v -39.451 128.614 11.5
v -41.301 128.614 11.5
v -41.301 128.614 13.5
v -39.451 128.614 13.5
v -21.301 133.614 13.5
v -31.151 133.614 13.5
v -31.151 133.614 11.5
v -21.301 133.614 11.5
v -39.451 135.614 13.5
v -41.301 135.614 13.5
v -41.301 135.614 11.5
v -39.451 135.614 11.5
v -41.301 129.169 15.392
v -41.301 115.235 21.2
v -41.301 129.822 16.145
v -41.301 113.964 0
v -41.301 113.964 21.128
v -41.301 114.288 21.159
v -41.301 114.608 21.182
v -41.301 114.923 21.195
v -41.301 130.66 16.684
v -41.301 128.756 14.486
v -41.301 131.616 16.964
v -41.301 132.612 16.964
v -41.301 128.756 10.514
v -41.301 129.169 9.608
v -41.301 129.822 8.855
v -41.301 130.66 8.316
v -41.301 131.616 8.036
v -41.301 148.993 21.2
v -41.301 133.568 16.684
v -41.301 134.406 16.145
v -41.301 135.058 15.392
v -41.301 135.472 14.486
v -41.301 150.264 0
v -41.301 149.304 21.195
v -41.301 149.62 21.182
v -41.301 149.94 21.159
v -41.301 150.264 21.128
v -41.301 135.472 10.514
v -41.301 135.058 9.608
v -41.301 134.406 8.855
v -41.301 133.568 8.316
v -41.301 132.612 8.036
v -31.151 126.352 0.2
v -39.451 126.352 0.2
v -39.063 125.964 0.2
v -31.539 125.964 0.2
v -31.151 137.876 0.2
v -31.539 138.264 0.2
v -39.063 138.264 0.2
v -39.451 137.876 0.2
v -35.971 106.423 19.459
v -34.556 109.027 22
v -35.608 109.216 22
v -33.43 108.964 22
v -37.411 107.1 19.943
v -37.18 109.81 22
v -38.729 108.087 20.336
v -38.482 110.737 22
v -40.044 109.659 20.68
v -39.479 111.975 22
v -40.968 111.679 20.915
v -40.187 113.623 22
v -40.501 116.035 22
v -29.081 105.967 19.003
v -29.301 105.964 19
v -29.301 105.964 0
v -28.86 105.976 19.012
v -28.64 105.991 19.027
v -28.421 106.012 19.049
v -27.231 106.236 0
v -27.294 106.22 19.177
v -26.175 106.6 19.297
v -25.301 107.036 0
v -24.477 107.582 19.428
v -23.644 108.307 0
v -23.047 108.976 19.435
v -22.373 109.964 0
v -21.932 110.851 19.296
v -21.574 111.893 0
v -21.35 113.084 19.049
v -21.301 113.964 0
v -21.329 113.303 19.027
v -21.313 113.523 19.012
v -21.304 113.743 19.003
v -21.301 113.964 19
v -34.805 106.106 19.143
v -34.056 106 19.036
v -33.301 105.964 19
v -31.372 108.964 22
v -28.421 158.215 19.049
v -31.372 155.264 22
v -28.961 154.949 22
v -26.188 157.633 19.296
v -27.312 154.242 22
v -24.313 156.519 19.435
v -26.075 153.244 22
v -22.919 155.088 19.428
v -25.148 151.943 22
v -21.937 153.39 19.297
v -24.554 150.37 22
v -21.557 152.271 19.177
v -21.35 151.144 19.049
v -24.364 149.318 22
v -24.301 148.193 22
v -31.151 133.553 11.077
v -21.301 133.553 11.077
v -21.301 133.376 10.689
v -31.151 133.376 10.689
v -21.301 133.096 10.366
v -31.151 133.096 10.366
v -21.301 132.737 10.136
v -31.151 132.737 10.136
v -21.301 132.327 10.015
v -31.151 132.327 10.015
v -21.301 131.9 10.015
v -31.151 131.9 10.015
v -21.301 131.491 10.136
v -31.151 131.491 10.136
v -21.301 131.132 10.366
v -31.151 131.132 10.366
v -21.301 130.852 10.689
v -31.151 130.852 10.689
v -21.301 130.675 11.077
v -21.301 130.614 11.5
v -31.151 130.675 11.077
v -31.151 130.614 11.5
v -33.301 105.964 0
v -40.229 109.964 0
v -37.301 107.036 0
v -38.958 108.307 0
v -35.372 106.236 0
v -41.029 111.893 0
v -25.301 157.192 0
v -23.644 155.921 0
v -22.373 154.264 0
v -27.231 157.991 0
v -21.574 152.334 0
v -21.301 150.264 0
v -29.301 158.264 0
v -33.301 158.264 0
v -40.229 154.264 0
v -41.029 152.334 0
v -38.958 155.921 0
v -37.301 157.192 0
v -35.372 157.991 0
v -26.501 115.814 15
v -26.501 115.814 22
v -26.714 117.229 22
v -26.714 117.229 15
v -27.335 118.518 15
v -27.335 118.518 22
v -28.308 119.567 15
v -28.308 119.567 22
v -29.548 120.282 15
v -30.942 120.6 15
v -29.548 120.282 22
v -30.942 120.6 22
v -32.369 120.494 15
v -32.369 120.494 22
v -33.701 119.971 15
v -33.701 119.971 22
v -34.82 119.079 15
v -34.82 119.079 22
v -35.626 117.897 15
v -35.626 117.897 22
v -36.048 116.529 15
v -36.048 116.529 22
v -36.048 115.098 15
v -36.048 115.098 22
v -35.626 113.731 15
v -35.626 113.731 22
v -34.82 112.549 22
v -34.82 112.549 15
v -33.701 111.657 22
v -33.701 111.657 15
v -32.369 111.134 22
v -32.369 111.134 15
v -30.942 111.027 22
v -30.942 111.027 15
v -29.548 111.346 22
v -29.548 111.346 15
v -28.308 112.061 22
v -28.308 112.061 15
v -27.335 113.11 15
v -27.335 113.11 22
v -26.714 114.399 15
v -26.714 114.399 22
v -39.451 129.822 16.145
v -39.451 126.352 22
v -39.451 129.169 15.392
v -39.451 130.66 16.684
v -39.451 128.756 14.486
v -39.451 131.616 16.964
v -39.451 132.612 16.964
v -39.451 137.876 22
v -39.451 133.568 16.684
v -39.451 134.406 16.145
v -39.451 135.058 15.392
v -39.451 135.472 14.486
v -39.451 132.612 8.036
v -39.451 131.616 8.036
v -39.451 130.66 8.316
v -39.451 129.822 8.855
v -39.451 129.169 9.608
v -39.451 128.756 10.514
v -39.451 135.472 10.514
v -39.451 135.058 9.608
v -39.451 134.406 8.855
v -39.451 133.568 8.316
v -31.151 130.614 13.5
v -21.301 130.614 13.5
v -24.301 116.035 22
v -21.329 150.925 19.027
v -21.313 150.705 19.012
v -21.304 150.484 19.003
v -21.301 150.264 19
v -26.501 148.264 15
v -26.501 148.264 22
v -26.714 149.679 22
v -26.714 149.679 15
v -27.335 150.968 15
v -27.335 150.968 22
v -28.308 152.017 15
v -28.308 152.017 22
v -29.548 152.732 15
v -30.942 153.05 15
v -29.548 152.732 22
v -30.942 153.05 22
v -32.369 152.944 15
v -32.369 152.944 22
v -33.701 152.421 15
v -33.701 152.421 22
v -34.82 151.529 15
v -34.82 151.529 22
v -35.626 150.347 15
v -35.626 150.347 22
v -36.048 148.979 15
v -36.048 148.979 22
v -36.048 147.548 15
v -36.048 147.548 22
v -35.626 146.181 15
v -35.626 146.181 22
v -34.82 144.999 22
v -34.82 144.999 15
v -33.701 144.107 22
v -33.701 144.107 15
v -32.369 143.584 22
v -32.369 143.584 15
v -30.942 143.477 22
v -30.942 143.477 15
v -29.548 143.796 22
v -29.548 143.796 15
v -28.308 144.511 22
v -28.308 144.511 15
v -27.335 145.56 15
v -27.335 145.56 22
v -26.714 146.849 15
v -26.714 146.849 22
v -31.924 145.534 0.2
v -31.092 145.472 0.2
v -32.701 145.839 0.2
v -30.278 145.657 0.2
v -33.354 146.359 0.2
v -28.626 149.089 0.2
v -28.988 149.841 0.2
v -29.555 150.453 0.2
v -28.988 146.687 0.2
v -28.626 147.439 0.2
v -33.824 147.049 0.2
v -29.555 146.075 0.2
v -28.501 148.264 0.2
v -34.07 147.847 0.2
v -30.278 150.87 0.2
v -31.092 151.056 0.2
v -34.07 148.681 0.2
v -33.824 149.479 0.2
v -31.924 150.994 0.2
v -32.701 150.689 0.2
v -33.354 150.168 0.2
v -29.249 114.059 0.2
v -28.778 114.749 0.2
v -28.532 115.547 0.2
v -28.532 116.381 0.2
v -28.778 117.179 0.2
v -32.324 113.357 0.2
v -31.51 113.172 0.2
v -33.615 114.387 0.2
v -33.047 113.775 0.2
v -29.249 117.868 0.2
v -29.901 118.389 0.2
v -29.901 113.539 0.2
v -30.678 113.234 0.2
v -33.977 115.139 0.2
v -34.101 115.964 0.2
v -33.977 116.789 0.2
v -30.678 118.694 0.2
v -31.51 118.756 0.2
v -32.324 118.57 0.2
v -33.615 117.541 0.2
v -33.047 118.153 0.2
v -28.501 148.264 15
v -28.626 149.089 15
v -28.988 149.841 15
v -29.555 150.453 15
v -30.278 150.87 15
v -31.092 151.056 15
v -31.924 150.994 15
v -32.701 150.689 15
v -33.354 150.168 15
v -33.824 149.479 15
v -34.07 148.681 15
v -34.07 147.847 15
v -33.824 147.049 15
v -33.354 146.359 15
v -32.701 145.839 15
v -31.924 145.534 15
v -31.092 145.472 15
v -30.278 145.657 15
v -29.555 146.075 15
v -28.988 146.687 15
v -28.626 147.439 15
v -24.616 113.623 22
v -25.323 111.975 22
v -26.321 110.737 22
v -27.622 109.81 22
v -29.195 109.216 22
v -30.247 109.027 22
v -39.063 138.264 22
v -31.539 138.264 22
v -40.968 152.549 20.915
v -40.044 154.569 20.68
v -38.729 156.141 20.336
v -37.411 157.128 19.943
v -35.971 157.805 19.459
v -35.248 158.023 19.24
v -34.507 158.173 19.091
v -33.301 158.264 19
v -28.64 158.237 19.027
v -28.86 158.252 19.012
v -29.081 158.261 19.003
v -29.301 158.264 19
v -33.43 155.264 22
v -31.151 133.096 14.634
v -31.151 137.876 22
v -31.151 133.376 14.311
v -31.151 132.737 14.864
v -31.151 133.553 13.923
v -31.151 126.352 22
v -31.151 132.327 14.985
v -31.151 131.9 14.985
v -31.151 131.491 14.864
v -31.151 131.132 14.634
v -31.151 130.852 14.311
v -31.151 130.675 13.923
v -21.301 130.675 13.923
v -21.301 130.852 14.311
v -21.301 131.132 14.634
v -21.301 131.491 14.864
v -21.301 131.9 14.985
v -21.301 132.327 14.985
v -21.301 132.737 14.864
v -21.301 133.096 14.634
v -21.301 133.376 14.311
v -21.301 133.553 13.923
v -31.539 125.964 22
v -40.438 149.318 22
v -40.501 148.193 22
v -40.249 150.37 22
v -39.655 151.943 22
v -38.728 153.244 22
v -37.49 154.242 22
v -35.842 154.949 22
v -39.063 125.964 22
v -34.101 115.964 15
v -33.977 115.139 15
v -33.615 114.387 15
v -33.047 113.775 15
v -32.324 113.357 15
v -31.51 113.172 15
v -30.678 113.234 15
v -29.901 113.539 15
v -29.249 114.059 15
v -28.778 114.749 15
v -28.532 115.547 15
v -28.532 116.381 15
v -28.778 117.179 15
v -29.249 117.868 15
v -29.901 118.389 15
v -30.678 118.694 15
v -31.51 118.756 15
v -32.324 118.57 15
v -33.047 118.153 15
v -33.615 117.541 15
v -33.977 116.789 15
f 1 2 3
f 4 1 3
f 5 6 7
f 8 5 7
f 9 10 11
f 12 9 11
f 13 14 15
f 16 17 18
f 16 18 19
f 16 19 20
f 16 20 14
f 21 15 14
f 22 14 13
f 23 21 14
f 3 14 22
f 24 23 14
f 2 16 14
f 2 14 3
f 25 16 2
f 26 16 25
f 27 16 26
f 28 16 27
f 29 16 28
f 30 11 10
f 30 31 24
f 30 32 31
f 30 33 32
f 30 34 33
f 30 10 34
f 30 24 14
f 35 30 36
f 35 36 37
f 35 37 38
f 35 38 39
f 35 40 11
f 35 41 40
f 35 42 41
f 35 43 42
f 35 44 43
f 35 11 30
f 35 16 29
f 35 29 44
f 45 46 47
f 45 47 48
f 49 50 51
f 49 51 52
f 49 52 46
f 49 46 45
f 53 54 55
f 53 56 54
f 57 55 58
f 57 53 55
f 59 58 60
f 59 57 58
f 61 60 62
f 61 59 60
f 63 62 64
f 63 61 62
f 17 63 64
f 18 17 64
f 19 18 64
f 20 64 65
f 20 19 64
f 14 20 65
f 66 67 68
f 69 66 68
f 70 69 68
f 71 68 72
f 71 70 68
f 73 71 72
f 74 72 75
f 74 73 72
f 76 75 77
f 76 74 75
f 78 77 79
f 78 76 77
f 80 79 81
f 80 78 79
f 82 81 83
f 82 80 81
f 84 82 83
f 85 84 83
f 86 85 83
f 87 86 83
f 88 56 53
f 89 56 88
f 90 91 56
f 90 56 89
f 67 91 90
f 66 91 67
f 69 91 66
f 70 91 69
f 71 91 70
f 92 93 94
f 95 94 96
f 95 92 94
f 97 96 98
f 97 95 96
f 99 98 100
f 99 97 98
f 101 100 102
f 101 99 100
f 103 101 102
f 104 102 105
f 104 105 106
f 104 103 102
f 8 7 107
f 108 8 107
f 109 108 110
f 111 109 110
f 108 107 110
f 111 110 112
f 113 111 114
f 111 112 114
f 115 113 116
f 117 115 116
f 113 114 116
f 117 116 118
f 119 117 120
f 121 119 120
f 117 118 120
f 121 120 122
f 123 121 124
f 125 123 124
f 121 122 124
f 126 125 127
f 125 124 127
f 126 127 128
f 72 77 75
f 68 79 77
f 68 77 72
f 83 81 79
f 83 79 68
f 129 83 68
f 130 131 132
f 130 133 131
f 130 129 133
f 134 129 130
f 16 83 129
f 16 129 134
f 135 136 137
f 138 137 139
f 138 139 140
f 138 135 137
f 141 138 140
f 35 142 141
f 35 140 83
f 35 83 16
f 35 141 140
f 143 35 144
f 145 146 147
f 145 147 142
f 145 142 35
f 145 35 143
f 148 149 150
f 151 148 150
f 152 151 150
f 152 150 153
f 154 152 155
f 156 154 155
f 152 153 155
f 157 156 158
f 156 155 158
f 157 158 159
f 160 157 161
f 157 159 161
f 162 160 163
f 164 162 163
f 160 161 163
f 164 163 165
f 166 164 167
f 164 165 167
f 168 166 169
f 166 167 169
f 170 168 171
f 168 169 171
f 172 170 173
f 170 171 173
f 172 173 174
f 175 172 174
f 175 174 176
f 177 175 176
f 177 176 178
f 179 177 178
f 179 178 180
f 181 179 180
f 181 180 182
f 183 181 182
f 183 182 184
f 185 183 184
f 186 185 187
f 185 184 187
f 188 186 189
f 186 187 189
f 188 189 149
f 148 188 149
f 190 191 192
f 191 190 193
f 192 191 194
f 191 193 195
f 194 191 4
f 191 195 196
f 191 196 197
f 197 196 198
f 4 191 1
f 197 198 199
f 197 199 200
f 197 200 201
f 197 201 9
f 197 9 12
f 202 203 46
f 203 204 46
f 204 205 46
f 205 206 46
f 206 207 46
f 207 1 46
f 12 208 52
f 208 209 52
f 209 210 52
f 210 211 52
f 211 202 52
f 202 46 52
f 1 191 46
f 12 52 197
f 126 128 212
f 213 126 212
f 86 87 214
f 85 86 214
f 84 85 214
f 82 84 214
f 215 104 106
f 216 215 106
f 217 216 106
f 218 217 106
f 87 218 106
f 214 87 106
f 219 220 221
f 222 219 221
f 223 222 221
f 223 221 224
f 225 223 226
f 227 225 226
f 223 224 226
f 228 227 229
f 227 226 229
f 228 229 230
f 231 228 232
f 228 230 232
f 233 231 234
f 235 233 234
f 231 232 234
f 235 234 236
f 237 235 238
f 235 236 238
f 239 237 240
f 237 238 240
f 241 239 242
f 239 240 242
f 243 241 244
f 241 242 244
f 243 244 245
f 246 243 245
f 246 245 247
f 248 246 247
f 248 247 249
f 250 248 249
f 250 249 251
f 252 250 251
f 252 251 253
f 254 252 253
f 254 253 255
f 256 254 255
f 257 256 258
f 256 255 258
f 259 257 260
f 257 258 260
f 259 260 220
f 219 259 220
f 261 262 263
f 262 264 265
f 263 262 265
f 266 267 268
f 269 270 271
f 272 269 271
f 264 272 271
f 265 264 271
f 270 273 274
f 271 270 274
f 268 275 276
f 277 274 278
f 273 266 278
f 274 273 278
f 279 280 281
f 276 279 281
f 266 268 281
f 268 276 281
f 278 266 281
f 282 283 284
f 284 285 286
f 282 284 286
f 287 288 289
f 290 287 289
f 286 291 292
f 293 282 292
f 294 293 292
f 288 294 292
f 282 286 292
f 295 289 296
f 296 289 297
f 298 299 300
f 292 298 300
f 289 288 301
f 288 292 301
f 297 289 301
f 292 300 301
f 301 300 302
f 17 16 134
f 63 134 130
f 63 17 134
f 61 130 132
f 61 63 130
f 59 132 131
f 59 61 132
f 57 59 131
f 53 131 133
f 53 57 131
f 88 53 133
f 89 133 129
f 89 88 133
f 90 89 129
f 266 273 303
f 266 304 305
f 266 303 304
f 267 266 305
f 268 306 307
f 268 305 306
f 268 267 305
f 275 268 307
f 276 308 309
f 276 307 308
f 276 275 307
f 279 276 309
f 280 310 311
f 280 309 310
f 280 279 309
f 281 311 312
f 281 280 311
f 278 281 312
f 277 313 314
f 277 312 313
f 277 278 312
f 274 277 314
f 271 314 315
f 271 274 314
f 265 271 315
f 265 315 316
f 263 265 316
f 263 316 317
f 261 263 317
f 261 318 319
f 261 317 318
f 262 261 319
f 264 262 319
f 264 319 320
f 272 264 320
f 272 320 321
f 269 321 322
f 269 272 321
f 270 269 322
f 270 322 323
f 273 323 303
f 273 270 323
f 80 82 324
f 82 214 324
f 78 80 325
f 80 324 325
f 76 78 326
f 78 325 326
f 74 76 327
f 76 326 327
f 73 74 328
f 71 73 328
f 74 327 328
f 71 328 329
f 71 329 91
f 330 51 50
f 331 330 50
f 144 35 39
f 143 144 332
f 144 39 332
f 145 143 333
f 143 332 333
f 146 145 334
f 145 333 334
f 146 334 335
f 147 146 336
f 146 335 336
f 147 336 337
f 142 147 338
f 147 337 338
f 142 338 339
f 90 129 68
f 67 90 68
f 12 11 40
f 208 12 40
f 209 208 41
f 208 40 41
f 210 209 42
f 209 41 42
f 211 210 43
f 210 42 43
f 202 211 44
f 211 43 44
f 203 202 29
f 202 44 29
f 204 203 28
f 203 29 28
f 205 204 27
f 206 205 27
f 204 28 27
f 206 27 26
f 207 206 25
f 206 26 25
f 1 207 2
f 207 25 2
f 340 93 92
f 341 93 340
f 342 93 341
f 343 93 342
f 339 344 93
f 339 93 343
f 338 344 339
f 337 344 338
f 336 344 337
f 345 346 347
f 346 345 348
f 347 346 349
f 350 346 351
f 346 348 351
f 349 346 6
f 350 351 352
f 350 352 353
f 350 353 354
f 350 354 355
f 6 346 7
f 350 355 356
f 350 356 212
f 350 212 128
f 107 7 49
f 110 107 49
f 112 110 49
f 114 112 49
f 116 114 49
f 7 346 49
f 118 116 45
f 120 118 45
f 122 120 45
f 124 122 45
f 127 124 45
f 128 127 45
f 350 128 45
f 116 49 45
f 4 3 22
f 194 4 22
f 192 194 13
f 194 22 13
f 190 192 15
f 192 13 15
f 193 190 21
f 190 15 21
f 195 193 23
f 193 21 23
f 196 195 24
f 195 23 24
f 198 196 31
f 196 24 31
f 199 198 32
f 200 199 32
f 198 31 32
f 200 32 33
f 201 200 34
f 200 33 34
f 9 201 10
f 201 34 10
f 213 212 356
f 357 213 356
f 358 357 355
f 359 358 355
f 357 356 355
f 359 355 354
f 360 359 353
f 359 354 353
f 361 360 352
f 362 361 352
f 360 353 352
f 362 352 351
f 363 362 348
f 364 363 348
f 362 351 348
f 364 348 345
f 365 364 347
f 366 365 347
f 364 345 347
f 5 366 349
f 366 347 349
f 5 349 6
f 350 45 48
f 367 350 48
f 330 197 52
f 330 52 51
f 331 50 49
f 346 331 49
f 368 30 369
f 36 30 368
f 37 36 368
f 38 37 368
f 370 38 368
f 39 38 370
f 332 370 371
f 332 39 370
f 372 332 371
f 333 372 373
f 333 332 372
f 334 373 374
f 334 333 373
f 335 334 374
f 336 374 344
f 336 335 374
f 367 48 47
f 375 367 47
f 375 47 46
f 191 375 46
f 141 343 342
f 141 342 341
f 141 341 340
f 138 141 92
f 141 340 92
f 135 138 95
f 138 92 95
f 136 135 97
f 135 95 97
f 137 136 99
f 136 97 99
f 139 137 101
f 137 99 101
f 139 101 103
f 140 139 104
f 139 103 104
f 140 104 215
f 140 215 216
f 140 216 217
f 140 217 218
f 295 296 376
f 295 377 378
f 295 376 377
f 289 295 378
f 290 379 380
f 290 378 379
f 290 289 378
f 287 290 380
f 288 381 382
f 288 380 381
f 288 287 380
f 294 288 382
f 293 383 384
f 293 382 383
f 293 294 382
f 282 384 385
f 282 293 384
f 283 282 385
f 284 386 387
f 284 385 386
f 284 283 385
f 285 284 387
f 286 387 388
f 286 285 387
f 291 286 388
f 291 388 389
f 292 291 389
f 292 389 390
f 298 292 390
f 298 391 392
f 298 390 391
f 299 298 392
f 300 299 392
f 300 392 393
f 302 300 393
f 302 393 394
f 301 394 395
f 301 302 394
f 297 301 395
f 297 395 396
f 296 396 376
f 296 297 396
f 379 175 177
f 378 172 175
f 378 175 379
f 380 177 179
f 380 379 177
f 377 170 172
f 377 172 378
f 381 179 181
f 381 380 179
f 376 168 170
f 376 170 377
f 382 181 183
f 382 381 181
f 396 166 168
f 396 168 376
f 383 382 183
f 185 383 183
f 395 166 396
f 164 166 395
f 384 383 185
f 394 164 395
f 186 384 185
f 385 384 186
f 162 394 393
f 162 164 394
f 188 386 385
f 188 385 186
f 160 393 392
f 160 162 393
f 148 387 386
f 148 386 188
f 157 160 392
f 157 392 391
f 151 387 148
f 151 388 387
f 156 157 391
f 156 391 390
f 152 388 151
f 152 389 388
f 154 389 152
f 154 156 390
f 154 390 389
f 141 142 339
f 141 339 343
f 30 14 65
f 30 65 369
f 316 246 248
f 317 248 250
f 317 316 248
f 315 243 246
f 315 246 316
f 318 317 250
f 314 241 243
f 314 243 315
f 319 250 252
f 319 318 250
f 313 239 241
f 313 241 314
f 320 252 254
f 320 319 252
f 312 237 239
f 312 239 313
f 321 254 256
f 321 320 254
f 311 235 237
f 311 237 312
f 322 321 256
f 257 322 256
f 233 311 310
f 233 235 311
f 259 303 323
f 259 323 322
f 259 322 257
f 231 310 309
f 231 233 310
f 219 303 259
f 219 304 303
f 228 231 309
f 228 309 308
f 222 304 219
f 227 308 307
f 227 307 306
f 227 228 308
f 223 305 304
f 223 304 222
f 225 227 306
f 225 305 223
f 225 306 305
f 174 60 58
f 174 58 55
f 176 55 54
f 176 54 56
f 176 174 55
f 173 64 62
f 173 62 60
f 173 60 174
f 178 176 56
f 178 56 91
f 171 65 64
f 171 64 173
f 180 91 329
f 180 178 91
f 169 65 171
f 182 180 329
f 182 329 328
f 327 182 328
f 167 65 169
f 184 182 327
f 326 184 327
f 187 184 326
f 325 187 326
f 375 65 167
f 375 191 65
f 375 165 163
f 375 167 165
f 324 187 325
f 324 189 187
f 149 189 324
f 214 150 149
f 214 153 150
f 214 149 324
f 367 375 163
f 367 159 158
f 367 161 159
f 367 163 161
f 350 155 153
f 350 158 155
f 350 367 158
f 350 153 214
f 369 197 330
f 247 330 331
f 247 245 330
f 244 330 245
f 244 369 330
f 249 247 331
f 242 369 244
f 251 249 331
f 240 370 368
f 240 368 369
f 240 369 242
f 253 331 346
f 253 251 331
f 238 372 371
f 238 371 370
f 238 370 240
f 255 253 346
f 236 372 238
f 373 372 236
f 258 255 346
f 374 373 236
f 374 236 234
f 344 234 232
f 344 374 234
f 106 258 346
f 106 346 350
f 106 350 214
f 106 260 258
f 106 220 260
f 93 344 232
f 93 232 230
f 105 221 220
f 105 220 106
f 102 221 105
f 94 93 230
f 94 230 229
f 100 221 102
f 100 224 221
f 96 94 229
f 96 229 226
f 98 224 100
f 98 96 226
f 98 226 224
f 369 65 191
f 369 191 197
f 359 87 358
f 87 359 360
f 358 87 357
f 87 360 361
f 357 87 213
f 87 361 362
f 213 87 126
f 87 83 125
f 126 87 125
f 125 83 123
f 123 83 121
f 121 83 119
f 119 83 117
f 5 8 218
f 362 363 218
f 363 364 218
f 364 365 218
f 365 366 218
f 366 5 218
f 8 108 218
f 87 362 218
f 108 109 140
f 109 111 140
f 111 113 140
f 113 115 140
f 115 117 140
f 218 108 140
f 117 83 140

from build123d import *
from build123d.topology import SkipClean

# Parameters (mm, degrees)
SZKIC1_W                        = 20
SZKIC1_H                        = 52.3
SZKIC1_R                        = 2.8
DODANIE_WYCI_GNI_CIE1_DEPTH     = 22
SZKIC2_R                        = 4.8
WYTNIJ_WYCI_GNI_CIE1_DEPTH      = 7
ZAOKR_GLENIE1_R                 = 8
WYTNIJ_WYCI_GNI_CIE2_DEPTH      = 161.813163879
WYTNIJ_WYCI_GNI_CIE2_DEPTH_BACK = 161.813163879
WYTNIJ_WYCI_GNI_CIE3_REACH      = 163.032
SZKIC7_R                        = 2.8
DODANIE_WYCI_GNI_CIE2_DEPTH     = 0.2
SFAZOWANIE1_SIZE                = 3
SFAZOWANIE2_SIZE                = 3
ZAOKR_GLENIE2_R                 = 10
SFAZOWANIE3_SIZE                = 0.8
ZAOKR_GLENIE3_START             = -102
ZAOKR_GLENIE3_DEPTH             = 6.947286026
ZAOKR_GLENIE3_START_2           = 51
ZAOKR_GLENIE3_2_DEPTH           = 6.499237843


with BuildPart() as part:
    # Szkic1 → Dodanie-wyciągnięcie1 (new body)
    with BuildSketch(Plane.XY):
        with Locations((-31.301196691, 132.11386567)):
            Rectangle(SZKIC1_W, SZKIC1_H)
        with Locations((-31.301196691, 148.26386567)):
            Circle(SZKIC1_R, mode=Mode.SUBTRACT)
        with Locations(Location((-31.301196691, 115.96386567, 0), (0, 0, 180))):
            Circle(SZKIC1_R, mode=Mode.SUBTRACT)
        Polygon((-33.860213685, 125.96386567), (-39.063328725, 125.96386567), (-39.451196691, 126.351733636), (-39.451196691, 137.875997705), (-39.063328725, 138.26386567), (-33.860213685, 138.26386567), (-33.560213685, 138.26386567), (-33.042179696, 138.26386567), (-32.742179696, 138.26386567), (-31.539064656, 138.26386567), (-31.151196691, 137.875997705), (-31.151196691, 126.351733636), (-31.539064656, 125.96386567), (-32.742179696, 125.96386567), (-33.042179696, 125.96386567), (-33.560213685, 125.96386567), align=None, mode=Mode.SUBTRACT)
    extrude(amount=DODANIE_WYCI_GNI_CIE1_DEPTH)

    # Szkic2 → Wytnij-wyciągnięcie1 (cut)
    with BuildSketch(Plane.XY.offset(22)):
        with Locations((-31.301196691, 148.26386567)):
            Circle(SZKIC2_R)
        with Locations((-31.301196691, 115.81386567)):
            Circle(SZKIC2_R)
    extrude(amount=-WYTNIJ_WYCI_GNI_CIE1_DEPTH, mode=Mode.SUBTRACT)

    # Zaokrąglenie1
    zaokr_glenie1_edges = [part.edges().sort_by_distance(p)[0] for p in [
        (-41.301196691, 105.96386567, 11),
        (-41.301196691, 158.26386567, 11),
        (-21.301196691, 158.26386567, 11),
        (-21.301196691, 105.96386567, 11),
    ]]
    fillet(zaokr_glenie1_edges, radius=ZAOKR_GLENIE1_R)

    # Szkic4 → Wytnij-wyciągnięcie2 (cut, two sides: drawn at the far end of the back side and taken through both)
    with BuildSketch(Plane(origin=(-39.451196691, 0, 0), x_dir=(0, 0, -1), z_dir=(1, 0, 0)).offset(-WYTNIJ_WYCI_GNI_CIE2_DEPTH_BACK)):
        with BuildLine():
            Line((-13.5, 133.61386567), (-11.5, 133.61386567))
            ThreePointArc((-11.5, 133.61386567), (-10, 132.11386567), (-11.5, 130.61386567))
            Line((-11.5, 130.61386567), (-13.5, 130.61386567))
            ThreePointArc((-13.5, 130.61386567), (-15, 132.11386567), (-13.5, 133.61386567))
        make_face()
    extrude(amount=WYTNIJ_WYCI_GNI_CIE2_DEPTH + WYTNIJ_WYCI_GNI_CIE2_DEPTH_BACK, mode=Mode.SUBTRACT)

    # Szkic6 → Wytnij-wyciągnięcie3 (cut, up to next)
    with BuildSketch(Plane.ZY.offset(41.301196691), mode=Mode.PRIVATE) as wytnij_wyci_gni_cie3_sk1:
        with BuildLine():
            Line((11.5, 128.61386567), (13.5, 128.61386567))
            ThreePointArc((13.5, 128.61386567), (17, 132.11386567), (13.5, 135.61386567))
            Line((13.5, 135.61386567), (11.5, 135.61386567))
            ThreePointArc((11.5, 135.61386567), (8, 132.11386567), (11.5, 128.61386567))
        make_face()
    wytnij_wyci_gni_cie3_tool1 = extrude(wytnij_wyci_gni_cie3_sk1.sketch, amount=-WYTNIJ_WYCI_GNI_CIE3_REACH, mode=Mode.PRIVATE) & part.part
    add(wytnij_wyci_gni_cie3_tool1.solids().sort_by_distance((-41.301197, 132.113866, 12.5))[0], mode=Mode.SUBTRACT)

    # Szkic7 → Dodanie-wyciągnięcie2 (add)
    with BuildSketch(Plane(origin=(0, 0, 0), x_dir=(-1, 0, 0), z_dir=(0, 0, -1))):
        with Locations((31.301196691, 115.96386567)):
            Circle(SZKIC7_R)
        with Locations((31.301196691, 148.26386567)):
            Circle(SZKIC7_R)
        Polygon((31.539064656, 125.96386567), (31.151196691, 126.351733636), (31.151196691, 137.875997705), (31.539064656, 138.26386567), (39.063328725, 138.26386567), (39.451196691, 137.875997705), (39.451196691, 126.351733636), (39.063328725, 125.96386567), align=None)
    extrude(amount=-DODANIE_WYCI_GNI_CIE2_DEPTH)

    # Sfazowanie1
    # the kernel refuses this chamfer: 3 mm, written as the material it takes off along each edge
    with BuildSketch(Plane(origin=(-21.301196691, 157.978914634, 22), x_dir=(0, 0, -1), z_dir=(0, -1, 0))) as sfazowanie1_piece_1:
        Polygon((SFAZOWANIE1_SIZE, 0), (0, -SFAZOWANIE1_SIZE), (0, 0), align=None)
    extrude(amount=51.730097928, mode=Mode.SUBTRACT)

    # Sfazowanie2
    # the kernel refuses this chamfer: 3 mm, written as the material it takes off along each edge
    with BuildSketch(Plane(origin=(-21.586147727, 105.96386567, 22), x_dir=(0, 1, 0), z_dir=(-1, 0, 0)), Plane(origin=(-41.016245655, 158.26386567, 22), x_dir=(0, -1, 0), z_dir=(1, 0, 0))) as sfazowanie2_piece_1:
        Polygon((SFAZOWANIE2_SIZE, 0), (0, SFAZOWANIE2_SIZE), (0, 0), align=None)
    extrude(amount=19.430097928, mode=Mode.SUBTRACT)

    # Zaokrąglenie2
    zaokr_glenie2_edges = [part.edges().sort_by_distance(p)[0] for p in [
        (-23.972769566, 108.635438546, 21.671572875),
        (-23.972769566, 155.592292795, 21.671572875),
    ]]
    fillet(zaokr_glenie2_edges, radius=ZAOKR_GLENIE2_R)

    # Sfazowanie3
    sfazowanie3_edges = [part.edges().sort_by_distance(p)[0] for p in [
        (-40.849705947, 152.913395441, 22),
        (-40.849705947, 111.3143359, 22),
        (-41.301196691, 132.11386567, 22),
    ]]
    chamfer(sfazowanie3_edges, length=SFAZOWANIE3_SIZE)

    # Zaokrąglenie3: read off the stored shape, not the designer's step
    # Zaokrąglenie3 outline → Zaokrąglenie3 (cut)
    with SkipClean():  # the faces are left unmerged after this step: merging them gives an invalid solid
        with BuildSketch(Plane(origin=(0, 0, 0), x_dir=(0.8164965809277239, 0.4082482904638656, -0.40824829046386485), z_dir=(0.5773502691896288, -0.5773502691896248, 0.5773502691896238)).offset(ZAOKR_GLENIE3_START)):
            with BuildLine():
                ThreePointArc((18.448905373, 120.344481475), (22.109159411, 124.004735513), (27.109159411, 125.344481475))
                Line((27.109159411, 125.344481475), (17, 125.344481475))
                Line((17, 125.344481475), (17, 119))
                Line((17, 119), (17.672668632, 119))
                Line((17.672668632, 119), (18.448905373, 120.344481475))
            make_face()
        extrude(amount=ZAOKR_GLENIE3_DEPTH, mode=Mode.SUBTRACT)

    # Zaokr_glenie3 2 outline → Zaokr_glenie3 2 (cut)
    with BuildSketch(Plane(origin=(0, 0, 0), x_dir=(0.816496580927723, -0.4082482904638645, -0.40824829046386735), z_dir=(0.5773502691896298, 0.5773502691896218, 0.5773502691896258)).offset(ZAOKR_GLENIE3_START_2)):
        with BuildLine():
            Line((-91, 61.492739134), (-80.761360202, 61.492739134))
            ThreePointArc((-80.761360202, 61.492739134), (-85.761360202, 62.832485096), (-89.42161424, 66.492739134))
            Line((-89.42161424, 66.492739134), (-90.291831707, 68))
            Line((-90.291831707, 68), (-91, 68))
            Line((-91, 68), (-91, 61.492739134))
        make_face()
    extrude(amount=ZAOKR_GLENIE3_2_DEPTH, mode=Mode.SUBTRACT)


solid = part.part
